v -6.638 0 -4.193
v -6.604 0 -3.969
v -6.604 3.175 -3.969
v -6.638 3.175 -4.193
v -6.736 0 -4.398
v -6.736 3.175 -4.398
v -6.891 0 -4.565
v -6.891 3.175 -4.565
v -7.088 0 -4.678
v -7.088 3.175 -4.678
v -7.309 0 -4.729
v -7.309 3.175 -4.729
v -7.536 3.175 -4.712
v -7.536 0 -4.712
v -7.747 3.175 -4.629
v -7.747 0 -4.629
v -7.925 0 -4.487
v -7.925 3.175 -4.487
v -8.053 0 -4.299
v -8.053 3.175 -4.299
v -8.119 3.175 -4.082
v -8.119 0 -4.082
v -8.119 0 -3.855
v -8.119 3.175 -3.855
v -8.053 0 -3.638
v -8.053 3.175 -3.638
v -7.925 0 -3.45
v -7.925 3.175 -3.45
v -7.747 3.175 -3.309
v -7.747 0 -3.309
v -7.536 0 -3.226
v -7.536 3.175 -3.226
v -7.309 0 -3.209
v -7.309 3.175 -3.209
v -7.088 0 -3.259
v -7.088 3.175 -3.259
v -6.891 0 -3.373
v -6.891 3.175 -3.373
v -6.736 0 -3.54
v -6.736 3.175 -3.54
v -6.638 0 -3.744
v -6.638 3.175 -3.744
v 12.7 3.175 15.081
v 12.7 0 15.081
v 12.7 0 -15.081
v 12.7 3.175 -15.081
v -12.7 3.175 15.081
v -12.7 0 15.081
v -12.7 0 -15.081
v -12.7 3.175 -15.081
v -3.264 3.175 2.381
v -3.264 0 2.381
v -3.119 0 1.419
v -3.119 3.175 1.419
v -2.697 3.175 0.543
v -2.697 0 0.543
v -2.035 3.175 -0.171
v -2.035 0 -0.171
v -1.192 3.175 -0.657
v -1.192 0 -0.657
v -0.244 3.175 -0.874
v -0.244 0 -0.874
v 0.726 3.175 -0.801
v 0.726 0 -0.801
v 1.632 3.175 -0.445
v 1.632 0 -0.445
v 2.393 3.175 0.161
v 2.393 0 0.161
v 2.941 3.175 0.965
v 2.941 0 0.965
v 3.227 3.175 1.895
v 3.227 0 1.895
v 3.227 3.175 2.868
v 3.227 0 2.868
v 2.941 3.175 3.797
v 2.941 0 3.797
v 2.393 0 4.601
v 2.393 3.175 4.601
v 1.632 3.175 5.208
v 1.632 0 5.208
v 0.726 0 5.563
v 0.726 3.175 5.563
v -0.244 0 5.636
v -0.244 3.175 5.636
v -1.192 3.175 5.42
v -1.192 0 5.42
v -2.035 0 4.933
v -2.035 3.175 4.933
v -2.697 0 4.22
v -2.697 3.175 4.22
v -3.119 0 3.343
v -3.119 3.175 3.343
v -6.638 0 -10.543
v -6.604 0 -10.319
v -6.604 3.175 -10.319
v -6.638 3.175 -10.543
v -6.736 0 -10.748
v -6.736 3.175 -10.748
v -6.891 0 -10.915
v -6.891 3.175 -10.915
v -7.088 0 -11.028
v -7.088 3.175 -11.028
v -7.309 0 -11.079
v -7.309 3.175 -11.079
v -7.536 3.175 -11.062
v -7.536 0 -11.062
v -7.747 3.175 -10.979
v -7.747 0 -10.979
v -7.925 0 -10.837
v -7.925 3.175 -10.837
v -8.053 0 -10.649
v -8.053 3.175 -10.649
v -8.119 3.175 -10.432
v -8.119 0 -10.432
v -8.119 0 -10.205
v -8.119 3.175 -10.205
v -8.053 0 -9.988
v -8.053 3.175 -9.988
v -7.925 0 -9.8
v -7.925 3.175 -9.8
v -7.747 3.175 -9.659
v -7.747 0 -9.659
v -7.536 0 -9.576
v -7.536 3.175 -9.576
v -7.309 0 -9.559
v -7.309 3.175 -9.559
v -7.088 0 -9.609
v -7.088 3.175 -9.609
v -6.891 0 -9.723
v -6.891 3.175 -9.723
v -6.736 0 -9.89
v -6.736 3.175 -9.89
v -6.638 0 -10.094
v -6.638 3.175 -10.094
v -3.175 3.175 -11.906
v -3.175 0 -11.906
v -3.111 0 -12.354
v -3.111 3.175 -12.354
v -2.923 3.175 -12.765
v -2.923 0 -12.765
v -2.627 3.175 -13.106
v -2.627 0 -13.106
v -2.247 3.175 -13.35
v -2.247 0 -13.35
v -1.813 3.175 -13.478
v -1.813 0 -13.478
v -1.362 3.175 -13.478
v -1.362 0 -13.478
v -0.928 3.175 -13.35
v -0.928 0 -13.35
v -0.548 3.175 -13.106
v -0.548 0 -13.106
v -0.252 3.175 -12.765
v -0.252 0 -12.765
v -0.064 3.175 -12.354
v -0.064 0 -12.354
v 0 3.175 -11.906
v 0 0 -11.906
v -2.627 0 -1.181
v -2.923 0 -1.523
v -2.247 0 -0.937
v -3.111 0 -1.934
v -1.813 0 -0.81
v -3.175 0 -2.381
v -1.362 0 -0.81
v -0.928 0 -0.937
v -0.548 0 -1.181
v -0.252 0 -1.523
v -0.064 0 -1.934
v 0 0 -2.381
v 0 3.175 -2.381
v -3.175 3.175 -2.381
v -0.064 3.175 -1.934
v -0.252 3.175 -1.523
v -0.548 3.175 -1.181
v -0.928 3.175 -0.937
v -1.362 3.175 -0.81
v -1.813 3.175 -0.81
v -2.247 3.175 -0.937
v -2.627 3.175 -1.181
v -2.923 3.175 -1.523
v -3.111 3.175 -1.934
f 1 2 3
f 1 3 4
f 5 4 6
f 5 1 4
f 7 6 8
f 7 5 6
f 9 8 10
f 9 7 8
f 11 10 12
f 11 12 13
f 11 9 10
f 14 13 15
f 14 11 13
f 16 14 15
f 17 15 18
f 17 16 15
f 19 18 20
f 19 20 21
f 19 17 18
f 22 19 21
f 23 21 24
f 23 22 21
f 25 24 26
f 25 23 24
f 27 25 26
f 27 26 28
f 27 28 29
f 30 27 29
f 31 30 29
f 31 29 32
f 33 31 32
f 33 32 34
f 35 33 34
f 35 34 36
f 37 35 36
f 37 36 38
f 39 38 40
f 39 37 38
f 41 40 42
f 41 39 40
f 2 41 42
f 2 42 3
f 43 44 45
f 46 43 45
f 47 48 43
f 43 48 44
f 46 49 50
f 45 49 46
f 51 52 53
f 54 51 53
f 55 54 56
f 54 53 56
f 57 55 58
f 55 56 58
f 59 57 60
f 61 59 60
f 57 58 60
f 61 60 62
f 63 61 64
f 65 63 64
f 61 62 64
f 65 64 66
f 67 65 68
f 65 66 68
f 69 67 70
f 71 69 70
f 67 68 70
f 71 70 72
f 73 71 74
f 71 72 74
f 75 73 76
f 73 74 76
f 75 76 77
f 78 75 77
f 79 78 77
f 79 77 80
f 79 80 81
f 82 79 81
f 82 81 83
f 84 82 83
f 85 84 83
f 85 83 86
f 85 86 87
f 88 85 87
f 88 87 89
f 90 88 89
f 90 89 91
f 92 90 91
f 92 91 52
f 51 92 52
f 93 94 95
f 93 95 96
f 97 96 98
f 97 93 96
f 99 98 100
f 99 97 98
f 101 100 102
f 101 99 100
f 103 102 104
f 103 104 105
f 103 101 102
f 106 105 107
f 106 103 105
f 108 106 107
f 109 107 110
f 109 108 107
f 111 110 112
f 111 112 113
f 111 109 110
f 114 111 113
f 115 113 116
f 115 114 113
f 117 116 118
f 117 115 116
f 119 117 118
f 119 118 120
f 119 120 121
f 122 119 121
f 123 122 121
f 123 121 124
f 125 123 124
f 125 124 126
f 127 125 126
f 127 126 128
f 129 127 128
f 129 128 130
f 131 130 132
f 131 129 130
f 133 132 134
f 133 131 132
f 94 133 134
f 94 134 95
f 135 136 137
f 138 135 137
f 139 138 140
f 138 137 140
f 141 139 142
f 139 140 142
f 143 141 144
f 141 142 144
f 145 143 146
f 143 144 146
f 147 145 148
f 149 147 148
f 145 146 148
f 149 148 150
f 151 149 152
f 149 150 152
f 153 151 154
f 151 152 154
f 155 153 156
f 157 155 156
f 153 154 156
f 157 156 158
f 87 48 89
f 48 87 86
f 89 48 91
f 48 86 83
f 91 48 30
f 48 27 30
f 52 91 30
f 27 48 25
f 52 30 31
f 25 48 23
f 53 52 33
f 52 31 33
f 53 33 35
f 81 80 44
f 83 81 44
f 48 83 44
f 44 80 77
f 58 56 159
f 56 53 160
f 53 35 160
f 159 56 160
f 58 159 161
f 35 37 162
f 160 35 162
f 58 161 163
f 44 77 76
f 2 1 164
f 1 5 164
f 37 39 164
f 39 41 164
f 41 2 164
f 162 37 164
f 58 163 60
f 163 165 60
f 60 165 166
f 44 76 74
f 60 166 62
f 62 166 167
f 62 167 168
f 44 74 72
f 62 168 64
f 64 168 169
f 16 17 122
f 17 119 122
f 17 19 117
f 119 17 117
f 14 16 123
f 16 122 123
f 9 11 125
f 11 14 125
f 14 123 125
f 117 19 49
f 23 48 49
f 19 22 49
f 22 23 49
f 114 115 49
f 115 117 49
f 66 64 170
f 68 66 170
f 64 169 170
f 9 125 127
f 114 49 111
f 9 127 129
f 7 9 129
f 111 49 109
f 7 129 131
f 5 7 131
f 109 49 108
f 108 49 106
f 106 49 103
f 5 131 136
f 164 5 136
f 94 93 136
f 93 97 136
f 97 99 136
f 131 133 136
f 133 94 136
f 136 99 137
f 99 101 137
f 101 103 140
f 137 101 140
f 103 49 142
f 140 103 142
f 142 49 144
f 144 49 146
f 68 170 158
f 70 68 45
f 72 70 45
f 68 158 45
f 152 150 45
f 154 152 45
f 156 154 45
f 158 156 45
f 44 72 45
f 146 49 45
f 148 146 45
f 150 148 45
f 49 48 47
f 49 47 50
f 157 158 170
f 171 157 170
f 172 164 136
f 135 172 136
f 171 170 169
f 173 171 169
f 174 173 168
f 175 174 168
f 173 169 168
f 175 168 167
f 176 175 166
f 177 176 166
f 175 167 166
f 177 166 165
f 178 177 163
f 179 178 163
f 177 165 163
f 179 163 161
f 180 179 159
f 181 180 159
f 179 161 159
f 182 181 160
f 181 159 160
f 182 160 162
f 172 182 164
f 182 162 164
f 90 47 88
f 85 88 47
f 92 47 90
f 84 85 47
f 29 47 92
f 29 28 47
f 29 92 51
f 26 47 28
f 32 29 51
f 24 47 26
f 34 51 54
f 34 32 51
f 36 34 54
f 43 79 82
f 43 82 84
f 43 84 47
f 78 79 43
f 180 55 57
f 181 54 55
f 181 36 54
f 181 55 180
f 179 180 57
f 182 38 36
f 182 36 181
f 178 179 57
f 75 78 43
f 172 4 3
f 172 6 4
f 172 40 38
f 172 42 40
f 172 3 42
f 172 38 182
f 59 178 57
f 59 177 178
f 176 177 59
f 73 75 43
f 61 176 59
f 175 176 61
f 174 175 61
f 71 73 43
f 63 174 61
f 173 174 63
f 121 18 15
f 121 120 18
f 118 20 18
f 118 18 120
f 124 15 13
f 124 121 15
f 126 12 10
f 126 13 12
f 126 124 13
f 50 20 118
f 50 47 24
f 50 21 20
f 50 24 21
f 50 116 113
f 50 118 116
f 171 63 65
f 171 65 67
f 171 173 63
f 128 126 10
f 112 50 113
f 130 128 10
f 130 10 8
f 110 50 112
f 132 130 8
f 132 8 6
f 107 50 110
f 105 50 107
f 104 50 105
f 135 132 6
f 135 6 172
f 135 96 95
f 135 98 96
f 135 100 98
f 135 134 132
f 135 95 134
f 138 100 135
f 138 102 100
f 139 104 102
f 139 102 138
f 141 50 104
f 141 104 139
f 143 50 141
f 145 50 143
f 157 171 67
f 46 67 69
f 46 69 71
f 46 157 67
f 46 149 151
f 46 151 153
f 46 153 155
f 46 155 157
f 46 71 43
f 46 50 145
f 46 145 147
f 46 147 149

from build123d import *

# Parameters (mm, degrees)
SKETCH1_W                   = 25.4
SKETCH1_H                   = 30.1625
SKETCH1_R                   = 0.762
BOSS_EXTRUDE1_DEPTH         = 3.175
F_1_4_CLEARANCE_HOLE1_D     = 6.5278
F_1_4_CLEARANCE_HOLE1_DEPTH = 6.35
F_1_4_CLEARANCE_HOLE1_TIP   = 1.961148974


with BuildPart() as part:
    # Sketch1 → Boss-Extrude1 (new body)
    with BuildSketch(Plane(origin=(0, 0, 0), x_dir=(1, 0, 0), z_dir=(0, 1, 0))):
        Rectangle(SKETCH1_W, SKETCH1_H)
        with Locations((-7.366, 3.96875)):
            Circle(SKETCH1_R, mode=Mode.SUBTRACT)
        with Locations((-7.366, 10.31875)):
            Circle(SKETCH1_R, mode=Mode.SUBTRACT)
        with BuildLine():
            Line((0, 11.90625), (0, 2.38125))
            ThreePointArc((0, 2.38125), (-1.5875, 0.79375), (-3.175, 2.38125))
            Line((-3.175, 2.38125), (-3.175, 11.90625))
            ThreePointArc((-3.175, 11.90625), (-1.5875, 13.49375), (0, 11.90625))
        make_face(mode=Mode.SUBTRACT)
    extrude(amount=BOSS_EXTRUDE1_DEPTH)

    # 1/4 Clearance Hole1
    with Locations(Plane(origin=(0, 3.175, 0), x_dir=(1, 0, 0), z_dir=(0, 1, 0))):
        with Locations((0, -2.38125)):
            Hole(F_1_4_CLEARANCE_HOLE1_D / 2, depth=F_1_4_CLEARANCE_HOLE1_DEPTH)
            with Locations((0, 0, -(F_1_4_CLEARANCE_HOLE1_DEPTH + F_1_4_CLEARANCE_HOLE1_TIP / 2))):  # 118° drill point
                Cone(0, F_1_4_CLEARANCE_HOLE1_D / 2, F_1_4_CLEARANCE_HOLE1_TIP, mode=Mode.SUBTRACT)


solid = part.part
